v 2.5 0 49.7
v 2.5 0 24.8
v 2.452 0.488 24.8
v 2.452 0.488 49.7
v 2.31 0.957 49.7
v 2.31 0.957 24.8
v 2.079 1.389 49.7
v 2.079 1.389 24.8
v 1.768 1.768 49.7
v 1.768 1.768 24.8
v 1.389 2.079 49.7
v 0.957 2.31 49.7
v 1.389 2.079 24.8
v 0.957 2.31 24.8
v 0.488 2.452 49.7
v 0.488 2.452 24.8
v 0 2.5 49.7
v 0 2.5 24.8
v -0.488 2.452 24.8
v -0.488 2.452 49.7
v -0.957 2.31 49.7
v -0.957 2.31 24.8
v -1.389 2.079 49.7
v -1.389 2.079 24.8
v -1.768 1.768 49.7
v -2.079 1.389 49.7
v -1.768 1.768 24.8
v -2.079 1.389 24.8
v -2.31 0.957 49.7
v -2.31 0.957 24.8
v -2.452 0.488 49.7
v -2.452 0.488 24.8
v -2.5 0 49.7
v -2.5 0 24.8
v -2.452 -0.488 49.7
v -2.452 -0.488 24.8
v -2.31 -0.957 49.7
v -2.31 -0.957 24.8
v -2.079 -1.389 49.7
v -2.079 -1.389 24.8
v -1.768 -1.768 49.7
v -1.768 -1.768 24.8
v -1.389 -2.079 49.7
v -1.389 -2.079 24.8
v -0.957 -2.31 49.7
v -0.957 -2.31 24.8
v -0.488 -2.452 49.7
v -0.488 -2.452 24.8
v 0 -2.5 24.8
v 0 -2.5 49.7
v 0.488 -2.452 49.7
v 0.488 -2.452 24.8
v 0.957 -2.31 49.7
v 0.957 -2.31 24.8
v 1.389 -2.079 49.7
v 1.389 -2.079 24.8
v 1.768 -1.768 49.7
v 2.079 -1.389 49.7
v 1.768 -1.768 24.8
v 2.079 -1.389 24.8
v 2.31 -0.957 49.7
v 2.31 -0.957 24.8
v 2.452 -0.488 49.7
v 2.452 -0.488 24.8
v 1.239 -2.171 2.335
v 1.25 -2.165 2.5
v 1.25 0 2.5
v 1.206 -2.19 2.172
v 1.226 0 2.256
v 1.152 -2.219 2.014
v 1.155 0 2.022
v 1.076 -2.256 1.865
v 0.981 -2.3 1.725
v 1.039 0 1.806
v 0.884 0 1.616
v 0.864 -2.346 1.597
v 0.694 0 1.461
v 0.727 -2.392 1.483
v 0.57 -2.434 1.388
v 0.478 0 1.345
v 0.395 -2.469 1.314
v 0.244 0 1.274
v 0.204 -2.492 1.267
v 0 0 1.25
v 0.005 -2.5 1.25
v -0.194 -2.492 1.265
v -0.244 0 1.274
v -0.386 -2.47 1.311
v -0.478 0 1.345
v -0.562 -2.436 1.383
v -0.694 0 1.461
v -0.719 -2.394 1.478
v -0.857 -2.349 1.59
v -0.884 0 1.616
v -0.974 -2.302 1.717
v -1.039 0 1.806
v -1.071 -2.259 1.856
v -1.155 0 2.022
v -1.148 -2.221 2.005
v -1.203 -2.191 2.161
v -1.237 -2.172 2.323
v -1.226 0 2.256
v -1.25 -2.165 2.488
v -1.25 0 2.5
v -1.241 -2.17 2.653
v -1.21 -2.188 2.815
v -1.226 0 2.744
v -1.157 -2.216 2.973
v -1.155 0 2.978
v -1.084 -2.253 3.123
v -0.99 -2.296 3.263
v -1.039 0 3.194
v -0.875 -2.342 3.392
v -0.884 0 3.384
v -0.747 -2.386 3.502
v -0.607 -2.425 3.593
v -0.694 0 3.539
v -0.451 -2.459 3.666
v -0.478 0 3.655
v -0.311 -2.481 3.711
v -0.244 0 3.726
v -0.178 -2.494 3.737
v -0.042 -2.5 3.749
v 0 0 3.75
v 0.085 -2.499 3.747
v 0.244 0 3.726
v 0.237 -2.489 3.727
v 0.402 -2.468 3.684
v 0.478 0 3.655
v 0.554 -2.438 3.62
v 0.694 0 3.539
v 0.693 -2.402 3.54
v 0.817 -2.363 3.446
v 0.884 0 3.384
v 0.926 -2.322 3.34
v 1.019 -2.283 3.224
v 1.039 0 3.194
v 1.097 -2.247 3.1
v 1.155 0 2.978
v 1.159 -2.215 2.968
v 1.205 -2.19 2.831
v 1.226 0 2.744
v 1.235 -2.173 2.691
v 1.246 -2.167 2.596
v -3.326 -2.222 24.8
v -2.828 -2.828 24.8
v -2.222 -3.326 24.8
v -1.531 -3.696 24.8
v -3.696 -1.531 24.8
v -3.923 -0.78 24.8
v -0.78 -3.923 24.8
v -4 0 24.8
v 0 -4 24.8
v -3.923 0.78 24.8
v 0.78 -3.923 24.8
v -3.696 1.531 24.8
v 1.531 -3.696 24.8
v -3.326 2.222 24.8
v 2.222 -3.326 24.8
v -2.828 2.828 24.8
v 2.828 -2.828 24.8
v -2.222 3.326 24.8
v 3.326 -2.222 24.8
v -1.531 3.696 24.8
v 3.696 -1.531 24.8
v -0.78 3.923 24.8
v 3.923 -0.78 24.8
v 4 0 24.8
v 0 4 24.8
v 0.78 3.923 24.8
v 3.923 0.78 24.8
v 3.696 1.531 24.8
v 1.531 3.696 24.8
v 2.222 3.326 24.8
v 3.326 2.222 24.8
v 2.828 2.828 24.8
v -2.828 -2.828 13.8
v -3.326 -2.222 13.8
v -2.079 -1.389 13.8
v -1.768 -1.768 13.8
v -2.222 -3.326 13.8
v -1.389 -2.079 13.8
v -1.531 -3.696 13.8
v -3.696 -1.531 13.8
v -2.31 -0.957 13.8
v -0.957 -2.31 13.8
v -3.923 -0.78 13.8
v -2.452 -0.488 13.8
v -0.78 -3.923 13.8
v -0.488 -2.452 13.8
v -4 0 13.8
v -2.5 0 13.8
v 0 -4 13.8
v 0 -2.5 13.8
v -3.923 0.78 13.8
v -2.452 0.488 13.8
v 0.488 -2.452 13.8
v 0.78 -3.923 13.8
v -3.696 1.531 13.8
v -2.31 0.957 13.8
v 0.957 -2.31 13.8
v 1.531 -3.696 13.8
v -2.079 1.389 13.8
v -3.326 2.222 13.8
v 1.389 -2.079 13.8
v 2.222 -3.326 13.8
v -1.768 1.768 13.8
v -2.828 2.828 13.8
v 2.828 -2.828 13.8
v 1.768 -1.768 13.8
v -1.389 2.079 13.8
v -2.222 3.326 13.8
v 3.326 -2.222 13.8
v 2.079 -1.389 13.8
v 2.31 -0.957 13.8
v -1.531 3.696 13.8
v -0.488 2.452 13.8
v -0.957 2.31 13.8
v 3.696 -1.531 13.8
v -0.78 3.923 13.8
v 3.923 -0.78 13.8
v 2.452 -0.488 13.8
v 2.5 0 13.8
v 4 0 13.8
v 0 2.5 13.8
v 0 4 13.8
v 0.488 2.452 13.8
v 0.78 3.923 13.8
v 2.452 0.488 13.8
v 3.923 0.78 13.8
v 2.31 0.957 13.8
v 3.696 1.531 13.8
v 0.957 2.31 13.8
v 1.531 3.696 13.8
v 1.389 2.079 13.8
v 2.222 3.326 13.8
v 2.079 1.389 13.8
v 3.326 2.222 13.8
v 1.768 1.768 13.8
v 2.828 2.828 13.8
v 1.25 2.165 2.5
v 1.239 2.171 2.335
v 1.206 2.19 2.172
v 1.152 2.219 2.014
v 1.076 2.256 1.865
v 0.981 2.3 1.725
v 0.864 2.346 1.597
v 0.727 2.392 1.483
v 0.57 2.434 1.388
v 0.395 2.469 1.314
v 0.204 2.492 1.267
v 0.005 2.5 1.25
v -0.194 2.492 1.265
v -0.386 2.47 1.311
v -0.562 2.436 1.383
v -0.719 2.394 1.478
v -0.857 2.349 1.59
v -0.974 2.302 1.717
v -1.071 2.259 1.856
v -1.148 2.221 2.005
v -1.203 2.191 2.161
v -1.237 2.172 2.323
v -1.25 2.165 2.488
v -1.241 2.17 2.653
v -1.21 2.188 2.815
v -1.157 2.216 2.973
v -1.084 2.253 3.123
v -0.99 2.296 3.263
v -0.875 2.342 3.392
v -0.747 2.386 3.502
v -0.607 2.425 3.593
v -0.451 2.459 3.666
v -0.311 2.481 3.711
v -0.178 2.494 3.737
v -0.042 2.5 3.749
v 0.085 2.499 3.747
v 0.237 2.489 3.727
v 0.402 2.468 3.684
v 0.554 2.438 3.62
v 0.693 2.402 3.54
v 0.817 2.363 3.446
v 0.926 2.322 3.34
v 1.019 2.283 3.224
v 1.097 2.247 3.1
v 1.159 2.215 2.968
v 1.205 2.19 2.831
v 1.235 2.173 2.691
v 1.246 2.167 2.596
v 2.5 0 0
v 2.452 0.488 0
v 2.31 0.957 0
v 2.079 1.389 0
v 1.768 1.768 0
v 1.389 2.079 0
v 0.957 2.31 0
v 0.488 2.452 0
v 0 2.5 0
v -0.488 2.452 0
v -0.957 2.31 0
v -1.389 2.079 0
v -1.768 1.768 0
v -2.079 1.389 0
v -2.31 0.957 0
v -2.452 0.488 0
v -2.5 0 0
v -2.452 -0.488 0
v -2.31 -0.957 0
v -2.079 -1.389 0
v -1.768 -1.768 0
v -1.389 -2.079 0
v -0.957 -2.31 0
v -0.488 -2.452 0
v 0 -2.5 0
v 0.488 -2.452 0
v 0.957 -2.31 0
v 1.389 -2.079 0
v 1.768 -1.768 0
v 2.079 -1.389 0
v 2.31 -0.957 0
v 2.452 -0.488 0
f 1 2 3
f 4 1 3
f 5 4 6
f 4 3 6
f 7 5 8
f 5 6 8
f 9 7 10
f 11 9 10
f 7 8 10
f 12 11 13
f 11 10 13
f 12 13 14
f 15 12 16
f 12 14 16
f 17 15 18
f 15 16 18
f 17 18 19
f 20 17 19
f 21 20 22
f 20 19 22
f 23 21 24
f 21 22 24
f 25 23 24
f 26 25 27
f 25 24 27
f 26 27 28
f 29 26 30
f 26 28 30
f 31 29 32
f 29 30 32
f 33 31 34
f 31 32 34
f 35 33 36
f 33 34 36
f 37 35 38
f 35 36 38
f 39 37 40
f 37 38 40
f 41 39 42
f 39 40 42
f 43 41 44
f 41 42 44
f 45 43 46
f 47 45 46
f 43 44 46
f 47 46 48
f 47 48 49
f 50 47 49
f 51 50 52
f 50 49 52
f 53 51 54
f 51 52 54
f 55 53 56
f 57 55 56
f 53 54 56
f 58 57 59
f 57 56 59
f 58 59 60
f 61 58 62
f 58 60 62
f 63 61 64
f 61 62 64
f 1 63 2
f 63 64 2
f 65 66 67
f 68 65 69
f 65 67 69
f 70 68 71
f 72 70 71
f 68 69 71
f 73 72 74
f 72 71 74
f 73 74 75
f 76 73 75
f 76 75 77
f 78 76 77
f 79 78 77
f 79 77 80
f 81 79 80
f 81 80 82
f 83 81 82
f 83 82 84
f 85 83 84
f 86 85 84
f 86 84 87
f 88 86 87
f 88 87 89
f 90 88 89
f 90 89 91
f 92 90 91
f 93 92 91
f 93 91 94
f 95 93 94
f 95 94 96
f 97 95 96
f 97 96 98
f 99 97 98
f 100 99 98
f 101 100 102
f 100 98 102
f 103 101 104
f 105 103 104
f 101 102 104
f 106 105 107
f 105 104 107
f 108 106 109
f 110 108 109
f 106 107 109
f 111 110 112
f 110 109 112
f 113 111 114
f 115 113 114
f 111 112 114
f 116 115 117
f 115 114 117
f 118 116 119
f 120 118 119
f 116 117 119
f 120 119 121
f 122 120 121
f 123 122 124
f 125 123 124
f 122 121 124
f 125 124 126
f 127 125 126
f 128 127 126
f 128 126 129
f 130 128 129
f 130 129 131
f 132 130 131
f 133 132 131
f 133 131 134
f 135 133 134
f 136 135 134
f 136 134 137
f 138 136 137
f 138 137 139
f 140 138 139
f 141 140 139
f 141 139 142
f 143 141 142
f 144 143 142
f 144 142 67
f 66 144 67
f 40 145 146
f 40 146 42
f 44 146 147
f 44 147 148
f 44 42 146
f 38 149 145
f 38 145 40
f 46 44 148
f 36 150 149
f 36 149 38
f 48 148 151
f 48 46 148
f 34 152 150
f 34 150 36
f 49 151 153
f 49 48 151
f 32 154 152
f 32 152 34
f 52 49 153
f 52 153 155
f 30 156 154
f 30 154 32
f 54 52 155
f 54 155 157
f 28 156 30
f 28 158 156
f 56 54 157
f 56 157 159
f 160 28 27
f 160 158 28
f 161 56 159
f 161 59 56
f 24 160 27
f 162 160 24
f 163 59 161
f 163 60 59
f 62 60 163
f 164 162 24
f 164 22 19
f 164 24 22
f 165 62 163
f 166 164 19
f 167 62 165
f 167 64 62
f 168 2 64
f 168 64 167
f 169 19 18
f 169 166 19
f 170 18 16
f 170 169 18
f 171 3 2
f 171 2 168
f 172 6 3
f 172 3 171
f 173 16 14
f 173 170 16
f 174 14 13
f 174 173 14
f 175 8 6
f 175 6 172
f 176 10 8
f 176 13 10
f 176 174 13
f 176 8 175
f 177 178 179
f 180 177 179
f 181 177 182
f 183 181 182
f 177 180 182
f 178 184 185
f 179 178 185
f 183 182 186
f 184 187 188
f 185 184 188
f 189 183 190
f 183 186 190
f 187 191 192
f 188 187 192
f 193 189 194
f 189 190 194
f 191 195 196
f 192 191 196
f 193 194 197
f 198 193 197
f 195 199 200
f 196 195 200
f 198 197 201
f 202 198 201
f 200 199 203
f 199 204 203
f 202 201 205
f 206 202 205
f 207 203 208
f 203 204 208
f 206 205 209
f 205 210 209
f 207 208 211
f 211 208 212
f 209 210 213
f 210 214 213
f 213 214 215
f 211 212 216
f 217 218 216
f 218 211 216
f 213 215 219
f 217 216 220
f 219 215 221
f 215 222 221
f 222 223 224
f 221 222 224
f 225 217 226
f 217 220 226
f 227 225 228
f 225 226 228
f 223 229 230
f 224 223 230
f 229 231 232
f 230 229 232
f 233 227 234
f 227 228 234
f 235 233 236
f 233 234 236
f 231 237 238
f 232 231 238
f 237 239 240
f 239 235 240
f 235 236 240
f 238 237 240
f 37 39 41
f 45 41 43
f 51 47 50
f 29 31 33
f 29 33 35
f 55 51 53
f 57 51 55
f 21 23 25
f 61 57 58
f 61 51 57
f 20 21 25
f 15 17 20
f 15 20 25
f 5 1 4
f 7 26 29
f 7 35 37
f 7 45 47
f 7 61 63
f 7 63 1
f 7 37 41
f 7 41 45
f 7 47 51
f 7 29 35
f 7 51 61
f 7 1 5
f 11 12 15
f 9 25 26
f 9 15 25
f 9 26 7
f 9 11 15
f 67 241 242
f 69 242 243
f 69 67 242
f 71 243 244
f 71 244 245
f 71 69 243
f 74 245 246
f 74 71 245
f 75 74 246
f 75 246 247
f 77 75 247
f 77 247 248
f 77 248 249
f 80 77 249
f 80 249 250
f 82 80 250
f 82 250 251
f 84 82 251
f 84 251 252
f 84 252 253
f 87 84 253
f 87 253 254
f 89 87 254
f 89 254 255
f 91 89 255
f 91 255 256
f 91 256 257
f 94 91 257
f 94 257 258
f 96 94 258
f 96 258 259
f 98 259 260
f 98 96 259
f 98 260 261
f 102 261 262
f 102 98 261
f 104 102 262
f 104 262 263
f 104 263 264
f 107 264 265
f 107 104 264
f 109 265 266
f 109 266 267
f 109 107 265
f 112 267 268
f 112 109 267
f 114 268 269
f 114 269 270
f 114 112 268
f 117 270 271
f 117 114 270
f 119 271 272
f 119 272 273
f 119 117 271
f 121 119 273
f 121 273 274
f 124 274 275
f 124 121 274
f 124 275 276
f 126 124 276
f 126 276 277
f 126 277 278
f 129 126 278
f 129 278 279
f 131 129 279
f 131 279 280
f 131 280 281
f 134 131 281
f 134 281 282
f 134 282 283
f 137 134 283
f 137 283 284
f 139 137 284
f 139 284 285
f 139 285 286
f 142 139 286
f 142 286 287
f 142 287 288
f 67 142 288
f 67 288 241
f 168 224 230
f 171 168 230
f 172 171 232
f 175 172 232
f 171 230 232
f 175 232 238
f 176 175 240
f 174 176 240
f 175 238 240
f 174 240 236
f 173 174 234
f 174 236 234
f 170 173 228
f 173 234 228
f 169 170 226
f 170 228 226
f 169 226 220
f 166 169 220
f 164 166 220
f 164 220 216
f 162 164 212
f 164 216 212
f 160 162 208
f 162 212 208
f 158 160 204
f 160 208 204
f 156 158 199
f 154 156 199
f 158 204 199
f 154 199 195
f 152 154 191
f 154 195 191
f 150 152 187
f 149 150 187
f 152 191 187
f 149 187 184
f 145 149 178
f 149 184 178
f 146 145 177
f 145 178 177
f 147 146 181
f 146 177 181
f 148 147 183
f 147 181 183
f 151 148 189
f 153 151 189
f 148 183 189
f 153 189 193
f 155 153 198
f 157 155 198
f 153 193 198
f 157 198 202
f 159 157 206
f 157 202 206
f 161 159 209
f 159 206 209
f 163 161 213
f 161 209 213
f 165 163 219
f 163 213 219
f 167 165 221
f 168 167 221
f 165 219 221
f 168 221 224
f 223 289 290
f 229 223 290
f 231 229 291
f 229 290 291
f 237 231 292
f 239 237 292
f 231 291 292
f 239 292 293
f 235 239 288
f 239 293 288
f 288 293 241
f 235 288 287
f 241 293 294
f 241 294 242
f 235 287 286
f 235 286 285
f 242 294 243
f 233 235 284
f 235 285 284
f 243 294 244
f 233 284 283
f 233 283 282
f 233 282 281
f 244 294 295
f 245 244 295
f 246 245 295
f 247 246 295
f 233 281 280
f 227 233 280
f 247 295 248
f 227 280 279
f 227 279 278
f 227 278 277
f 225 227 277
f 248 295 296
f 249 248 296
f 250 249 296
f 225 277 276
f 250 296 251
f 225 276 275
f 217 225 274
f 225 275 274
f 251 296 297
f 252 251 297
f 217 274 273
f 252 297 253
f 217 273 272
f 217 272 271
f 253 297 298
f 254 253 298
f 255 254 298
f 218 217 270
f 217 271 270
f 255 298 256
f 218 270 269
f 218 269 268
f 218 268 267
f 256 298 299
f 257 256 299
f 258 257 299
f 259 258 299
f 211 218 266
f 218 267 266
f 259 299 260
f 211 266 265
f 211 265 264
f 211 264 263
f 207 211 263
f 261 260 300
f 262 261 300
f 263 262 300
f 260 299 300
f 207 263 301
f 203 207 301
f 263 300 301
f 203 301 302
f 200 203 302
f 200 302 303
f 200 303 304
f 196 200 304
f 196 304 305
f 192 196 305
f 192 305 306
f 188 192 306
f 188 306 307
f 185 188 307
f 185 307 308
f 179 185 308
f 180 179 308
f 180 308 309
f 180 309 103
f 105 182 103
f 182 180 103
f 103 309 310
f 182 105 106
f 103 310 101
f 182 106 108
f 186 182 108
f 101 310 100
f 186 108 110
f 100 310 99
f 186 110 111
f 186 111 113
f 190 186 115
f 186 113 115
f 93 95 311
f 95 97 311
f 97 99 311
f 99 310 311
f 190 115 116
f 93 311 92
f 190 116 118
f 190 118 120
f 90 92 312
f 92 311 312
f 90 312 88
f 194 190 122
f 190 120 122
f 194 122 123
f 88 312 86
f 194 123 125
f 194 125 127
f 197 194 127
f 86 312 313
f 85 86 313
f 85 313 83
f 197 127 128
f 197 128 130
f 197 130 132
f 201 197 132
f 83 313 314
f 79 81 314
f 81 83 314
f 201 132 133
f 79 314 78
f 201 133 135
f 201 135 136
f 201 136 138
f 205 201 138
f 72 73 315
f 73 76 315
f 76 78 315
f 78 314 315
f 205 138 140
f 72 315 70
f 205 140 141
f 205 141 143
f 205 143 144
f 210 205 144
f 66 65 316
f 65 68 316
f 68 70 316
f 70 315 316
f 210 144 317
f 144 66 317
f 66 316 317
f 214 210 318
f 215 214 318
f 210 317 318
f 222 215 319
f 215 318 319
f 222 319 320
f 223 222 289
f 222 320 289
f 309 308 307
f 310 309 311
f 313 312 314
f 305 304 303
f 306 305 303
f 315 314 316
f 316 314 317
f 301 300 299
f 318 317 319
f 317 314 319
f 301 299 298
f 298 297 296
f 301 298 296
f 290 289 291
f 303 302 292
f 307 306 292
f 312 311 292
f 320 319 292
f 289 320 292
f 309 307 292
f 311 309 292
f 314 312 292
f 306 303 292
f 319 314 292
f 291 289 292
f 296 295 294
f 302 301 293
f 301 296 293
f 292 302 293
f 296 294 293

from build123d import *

# Parameters (mm, degrees)
SKETCH1_R               = 2.5
BOSS_EXTRUDE1_DEPTH     = 13.8
BOSS_EXTRUDE3_START     = 13.8
SKETCH1_4_R             = 4
BOSS_EXTRUDE3_DEPTH     = 11
BOSS_EXTRUDE2_START     = 24.8
SKETCH1_3_R             = 2.5
BOSS_EXTRUDE2_DEPTH     = 24.9
SKETCH17_R              = 1.25
CUT_EXTRUDE1_DEPTH      = 5
CUT_EXTRUDE1_DEPTH_BACK = 5


with BuildPart() as part:
    # Sketch1 → Boss-Extrude1 (new body)
    with BuildSketch(Plane.XY):
        Circle(SKETCH1_R)
    extrude(amount=BOSS_EXTRUDE1_DEPTH)

    # Sketch1<4> → Boss-Extrude3 (add)
    with BuildSketch(Plane.XY.offset(BOSS_EXTRUDE3_START)):
        Circle(SKETCH1_4_R)
    extrude(amount=BOSS_EXTRUDE3_DEPTH)

    # Sketch1<3> → Boss-Extrude2 (add)
    with BuildSketch(Plane.XY.offset(BOSS_EXTRUDE2_START)):
        Circle(SKETCH1_3_R)
    extrude(amount=BOSS_EXTRUDE2_DEPTH)

    # Sketch17 → Cut-Extrude1 (cut, two sides)
    with BuildSketch(Plane(origin=(0, 0, 0), x_dir=(1, 0, 0), z_dir=(0, 1, 0))) as cut_extrude1_sk:
        with Locations((0, -2.5)):
            Circle(SKETCH17_R)
    extrude(amount=CUT_EXTRUDE1_DEPTH, mode=Mode.SUBTRACT)
    extrude(cut_extrude1_sk.sketch, amount=-CUT_EXTRUDE1_DEPTH_BACK, mode=Mode.SUBTRACT)


solid = part.part
